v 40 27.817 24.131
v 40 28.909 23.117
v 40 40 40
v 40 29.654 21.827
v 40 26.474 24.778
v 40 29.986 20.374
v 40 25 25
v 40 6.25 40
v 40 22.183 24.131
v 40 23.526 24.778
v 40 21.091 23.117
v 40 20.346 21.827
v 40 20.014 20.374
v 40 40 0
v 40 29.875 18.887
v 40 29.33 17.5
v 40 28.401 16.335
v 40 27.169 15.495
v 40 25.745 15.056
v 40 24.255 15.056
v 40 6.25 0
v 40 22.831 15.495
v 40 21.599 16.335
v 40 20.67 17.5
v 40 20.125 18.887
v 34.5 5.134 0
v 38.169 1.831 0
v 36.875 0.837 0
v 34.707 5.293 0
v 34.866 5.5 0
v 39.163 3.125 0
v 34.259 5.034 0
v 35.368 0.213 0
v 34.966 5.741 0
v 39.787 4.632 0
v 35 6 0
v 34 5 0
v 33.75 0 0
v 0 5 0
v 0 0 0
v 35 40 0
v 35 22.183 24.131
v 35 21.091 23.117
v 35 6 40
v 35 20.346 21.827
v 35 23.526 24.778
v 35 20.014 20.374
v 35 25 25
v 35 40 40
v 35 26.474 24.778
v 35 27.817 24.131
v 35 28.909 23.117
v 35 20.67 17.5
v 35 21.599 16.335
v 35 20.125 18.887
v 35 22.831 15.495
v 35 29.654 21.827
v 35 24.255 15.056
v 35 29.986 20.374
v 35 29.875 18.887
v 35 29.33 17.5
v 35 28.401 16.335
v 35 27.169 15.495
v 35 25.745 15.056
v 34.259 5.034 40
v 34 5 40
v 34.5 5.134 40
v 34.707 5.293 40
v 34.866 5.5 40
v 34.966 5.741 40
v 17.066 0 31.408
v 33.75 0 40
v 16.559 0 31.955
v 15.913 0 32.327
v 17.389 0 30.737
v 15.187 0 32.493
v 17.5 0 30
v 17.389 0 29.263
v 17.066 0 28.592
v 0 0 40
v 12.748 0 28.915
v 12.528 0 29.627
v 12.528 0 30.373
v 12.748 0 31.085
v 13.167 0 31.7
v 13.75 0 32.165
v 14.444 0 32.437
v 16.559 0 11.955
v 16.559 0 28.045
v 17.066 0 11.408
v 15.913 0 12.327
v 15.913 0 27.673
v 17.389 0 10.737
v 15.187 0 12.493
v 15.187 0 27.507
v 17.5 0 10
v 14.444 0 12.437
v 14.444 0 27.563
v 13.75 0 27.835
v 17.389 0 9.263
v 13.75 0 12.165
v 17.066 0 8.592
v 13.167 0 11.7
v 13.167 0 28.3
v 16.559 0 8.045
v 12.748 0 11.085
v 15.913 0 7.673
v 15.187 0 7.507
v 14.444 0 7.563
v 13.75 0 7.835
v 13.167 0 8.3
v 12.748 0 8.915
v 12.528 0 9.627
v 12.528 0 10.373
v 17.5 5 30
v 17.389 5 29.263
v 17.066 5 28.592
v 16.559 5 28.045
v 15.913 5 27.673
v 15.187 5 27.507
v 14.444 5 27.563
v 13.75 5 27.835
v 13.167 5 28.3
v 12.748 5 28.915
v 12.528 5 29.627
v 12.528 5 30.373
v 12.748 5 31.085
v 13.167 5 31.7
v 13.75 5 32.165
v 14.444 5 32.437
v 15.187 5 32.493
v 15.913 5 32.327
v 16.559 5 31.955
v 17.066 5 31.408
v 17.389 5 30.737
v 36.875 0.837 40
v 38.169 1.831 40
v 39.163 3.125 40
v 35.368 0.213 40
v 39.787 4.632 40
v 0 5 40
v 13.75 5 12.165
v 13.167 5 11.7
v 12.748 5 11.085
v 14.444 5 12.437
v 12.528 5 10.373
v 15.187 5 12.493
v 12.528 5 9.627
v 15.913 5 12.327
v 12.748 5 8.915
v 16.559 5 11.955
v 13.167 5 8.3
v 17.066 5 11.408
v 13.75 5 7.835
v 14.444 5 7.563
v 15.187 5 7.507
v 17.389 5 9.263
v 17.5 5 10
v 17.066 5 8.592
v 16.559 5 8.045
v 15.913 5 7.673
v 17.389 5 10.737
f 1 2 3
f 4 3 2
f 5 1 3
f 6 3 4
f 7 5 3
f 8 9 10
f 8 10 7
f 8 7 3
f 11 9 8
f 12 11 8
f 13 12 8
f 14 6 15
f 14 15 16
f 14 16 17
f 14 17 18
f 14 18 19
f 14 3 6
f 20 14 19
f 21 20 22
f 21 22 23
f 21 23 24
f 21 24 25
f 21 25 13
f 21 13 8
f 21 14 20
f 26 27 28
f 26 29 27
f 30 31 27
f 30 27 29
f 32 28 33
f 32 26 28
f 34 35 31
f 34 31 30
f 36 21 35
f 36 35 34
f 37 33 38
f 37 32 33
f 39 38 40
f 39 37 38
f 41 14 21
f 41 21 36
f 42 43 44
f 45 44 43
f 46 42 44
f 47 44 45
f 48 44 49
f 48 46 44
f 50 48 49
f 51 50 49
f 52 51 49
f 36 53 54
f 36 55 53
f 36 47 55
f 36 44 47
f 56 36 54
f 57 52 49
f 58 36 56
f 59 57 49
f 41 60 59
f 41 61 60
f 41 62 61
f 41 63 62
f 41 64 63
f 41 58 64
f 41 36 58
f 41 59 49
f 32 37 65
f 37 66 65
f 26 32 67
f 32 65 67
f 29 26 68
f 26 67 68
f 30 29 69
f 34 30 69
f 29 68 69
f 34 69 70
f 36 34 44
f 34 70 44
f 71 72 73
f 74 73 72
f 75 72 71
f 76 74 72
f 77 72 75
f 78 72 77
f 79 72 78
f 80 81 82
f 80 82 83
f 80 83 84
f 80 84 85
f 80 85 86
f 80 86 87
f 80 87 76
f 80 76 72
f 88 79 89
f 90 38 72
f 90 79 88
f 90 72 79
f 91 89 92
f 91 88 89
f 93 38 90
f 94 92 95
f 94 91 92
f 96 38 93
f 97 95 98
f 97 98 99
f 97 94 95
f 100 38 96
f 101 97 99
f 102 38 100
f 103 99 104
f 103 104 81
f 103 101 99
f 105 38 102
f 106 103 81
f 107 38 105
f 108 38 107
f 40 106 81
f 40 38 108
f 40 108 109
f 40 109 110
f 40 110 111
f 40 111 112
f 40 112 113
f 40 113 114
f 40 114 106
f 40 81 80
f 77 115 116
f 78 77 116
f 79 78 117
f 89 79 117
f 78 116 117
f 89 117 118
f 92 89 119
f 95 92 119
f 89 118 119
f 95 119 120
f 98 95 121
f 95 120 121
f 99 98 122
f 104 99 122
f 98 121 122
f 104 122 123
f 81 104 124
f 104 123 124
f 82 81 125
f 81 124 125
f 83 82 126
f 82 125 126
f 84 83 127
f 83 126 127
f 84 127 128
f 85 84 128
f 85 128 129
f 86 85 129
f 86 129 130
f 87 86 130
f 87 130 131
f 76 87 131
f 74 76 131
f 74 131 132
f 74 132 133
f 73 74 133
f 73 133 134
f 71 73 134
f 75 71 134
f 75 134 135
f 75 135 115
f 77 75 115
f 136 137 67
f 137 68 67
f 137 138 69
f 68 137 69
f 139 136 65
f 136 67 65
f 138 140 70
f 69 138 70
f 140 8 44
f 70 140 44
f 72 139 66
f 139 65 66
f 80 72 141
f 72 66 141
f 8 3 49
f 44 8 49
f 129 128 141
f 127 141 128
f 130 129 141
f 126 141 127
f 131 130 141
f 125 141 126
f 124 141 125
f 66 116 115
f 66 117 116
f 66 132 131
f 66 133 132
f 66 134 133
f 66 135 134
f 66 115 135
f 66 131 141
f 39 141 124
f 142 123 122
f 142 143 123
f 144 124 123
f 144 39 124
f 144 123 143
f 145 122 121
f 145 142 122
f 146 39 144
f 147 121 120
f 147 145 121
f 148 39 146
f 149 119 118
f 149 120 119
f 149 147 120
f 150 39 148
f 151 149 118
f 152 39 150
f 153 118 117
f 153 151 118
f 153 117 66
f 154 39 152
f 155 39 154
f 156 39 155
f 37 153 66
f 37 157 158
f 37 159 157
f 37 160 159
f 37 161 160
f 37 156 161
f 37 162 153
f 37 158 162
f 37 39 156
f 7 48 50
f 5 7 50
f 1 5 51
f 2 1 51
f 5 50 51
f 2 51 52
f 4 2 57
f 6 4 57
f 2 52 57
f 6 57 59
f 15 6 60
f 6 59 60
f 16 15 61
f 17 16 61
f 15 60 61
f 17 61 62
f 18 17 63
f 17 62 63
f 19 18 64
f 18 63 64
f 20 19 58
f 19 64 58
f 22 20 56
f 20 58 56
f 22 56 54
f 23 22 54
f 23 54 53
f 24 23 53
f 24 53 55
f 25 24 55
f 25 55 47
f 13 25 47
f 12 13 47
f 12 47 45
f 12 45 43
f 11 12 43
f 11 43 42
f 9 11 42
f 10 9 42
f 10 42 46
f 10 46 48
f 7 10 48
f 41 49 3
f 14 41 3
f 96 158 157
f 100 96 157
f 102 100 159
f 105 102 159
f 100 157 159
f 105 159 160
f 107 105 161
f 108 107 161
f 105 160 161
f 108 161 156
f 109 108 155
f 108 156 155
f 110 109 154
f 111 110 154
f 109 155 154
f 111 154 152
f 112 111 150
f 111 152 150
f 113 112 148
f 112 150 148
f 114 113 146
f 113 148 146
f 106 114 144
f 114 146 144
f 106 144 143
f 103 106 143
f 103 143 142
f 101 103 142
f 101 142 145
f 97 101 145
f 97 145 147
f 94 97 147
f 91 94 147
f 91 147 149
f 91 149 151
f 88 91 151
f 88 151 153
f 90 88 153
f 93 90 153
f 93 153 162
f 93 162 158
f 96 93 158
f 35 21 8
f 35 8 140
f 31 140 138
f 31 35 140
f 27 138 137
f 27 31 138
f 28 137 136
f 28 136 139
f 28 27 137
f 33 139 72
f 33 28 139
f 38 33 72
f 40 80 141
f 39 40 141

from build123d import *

# Parameters (mm, degrees)
BOSS_EXTRUDE1_DEPTH = 40
SKETCH3_R           = 2.5
CUT_EXTRUDE1_DEPTH  = 6
SKETCH4_R           = 5
CUT_EXTRUDE2_DEPTH  = 6
FILLET1_R           = 1


with BuildPart() as part:
    # Sketch1 → Boss-Extrude1 (new body)
    with BuildSketch(Plane.XY):
        with BuildLine():
            Line((0, 0), (0, 5))
            Line((0, 5), (35, 5))
            Line((35, 5), (35, 40))
            Line((35, 40), (40, 40))
            Line((40, 40), (40, 6.25))
            ThreePointArc((40, 6.25), (38.169417382, 1.830582618), (33.75, 0))
            Line((33.75, 0), (0, 0))
        make_face()
    extrude(amount=BOSS_EXTRUDE1_DEPTH)

    # Sketch3 → Cut-Extrude1 (cut, through all)
    with BuildSketch(Plane(origin=(0, 5, 0), x_dir=(1, 0, 0), z_dir=(0, 1, 0))):
        with Locations((15, -10)):
            Circle(SKETCH3_R)
        with Locations((15, -30)):
            Circle(SKETCH3_R)
    extrude(amount=-CUT_EXTRUDE1_DEPTH, mode=Mode.SUBTRACT)

    # Sketch4 → Cut-Extrude2 (cut, through all)
    with BuildSketch(Plane.ZY.offset(-35)):
        with Locations((20, 25)):
            Circle(SKETCH4_R)
    extrude(amount=-CUT_EXTRUDE2_DEPTH, mode=Mode.SUBTRACT)

    # Fillet1
    fillet1_edges = [part.edges().sort_by_distance(p)[0] for p in [
        (35, 5, 20),
    ]]
    fillet(fillet1_edges, radius=FILLET1_R)


solid = part.part
